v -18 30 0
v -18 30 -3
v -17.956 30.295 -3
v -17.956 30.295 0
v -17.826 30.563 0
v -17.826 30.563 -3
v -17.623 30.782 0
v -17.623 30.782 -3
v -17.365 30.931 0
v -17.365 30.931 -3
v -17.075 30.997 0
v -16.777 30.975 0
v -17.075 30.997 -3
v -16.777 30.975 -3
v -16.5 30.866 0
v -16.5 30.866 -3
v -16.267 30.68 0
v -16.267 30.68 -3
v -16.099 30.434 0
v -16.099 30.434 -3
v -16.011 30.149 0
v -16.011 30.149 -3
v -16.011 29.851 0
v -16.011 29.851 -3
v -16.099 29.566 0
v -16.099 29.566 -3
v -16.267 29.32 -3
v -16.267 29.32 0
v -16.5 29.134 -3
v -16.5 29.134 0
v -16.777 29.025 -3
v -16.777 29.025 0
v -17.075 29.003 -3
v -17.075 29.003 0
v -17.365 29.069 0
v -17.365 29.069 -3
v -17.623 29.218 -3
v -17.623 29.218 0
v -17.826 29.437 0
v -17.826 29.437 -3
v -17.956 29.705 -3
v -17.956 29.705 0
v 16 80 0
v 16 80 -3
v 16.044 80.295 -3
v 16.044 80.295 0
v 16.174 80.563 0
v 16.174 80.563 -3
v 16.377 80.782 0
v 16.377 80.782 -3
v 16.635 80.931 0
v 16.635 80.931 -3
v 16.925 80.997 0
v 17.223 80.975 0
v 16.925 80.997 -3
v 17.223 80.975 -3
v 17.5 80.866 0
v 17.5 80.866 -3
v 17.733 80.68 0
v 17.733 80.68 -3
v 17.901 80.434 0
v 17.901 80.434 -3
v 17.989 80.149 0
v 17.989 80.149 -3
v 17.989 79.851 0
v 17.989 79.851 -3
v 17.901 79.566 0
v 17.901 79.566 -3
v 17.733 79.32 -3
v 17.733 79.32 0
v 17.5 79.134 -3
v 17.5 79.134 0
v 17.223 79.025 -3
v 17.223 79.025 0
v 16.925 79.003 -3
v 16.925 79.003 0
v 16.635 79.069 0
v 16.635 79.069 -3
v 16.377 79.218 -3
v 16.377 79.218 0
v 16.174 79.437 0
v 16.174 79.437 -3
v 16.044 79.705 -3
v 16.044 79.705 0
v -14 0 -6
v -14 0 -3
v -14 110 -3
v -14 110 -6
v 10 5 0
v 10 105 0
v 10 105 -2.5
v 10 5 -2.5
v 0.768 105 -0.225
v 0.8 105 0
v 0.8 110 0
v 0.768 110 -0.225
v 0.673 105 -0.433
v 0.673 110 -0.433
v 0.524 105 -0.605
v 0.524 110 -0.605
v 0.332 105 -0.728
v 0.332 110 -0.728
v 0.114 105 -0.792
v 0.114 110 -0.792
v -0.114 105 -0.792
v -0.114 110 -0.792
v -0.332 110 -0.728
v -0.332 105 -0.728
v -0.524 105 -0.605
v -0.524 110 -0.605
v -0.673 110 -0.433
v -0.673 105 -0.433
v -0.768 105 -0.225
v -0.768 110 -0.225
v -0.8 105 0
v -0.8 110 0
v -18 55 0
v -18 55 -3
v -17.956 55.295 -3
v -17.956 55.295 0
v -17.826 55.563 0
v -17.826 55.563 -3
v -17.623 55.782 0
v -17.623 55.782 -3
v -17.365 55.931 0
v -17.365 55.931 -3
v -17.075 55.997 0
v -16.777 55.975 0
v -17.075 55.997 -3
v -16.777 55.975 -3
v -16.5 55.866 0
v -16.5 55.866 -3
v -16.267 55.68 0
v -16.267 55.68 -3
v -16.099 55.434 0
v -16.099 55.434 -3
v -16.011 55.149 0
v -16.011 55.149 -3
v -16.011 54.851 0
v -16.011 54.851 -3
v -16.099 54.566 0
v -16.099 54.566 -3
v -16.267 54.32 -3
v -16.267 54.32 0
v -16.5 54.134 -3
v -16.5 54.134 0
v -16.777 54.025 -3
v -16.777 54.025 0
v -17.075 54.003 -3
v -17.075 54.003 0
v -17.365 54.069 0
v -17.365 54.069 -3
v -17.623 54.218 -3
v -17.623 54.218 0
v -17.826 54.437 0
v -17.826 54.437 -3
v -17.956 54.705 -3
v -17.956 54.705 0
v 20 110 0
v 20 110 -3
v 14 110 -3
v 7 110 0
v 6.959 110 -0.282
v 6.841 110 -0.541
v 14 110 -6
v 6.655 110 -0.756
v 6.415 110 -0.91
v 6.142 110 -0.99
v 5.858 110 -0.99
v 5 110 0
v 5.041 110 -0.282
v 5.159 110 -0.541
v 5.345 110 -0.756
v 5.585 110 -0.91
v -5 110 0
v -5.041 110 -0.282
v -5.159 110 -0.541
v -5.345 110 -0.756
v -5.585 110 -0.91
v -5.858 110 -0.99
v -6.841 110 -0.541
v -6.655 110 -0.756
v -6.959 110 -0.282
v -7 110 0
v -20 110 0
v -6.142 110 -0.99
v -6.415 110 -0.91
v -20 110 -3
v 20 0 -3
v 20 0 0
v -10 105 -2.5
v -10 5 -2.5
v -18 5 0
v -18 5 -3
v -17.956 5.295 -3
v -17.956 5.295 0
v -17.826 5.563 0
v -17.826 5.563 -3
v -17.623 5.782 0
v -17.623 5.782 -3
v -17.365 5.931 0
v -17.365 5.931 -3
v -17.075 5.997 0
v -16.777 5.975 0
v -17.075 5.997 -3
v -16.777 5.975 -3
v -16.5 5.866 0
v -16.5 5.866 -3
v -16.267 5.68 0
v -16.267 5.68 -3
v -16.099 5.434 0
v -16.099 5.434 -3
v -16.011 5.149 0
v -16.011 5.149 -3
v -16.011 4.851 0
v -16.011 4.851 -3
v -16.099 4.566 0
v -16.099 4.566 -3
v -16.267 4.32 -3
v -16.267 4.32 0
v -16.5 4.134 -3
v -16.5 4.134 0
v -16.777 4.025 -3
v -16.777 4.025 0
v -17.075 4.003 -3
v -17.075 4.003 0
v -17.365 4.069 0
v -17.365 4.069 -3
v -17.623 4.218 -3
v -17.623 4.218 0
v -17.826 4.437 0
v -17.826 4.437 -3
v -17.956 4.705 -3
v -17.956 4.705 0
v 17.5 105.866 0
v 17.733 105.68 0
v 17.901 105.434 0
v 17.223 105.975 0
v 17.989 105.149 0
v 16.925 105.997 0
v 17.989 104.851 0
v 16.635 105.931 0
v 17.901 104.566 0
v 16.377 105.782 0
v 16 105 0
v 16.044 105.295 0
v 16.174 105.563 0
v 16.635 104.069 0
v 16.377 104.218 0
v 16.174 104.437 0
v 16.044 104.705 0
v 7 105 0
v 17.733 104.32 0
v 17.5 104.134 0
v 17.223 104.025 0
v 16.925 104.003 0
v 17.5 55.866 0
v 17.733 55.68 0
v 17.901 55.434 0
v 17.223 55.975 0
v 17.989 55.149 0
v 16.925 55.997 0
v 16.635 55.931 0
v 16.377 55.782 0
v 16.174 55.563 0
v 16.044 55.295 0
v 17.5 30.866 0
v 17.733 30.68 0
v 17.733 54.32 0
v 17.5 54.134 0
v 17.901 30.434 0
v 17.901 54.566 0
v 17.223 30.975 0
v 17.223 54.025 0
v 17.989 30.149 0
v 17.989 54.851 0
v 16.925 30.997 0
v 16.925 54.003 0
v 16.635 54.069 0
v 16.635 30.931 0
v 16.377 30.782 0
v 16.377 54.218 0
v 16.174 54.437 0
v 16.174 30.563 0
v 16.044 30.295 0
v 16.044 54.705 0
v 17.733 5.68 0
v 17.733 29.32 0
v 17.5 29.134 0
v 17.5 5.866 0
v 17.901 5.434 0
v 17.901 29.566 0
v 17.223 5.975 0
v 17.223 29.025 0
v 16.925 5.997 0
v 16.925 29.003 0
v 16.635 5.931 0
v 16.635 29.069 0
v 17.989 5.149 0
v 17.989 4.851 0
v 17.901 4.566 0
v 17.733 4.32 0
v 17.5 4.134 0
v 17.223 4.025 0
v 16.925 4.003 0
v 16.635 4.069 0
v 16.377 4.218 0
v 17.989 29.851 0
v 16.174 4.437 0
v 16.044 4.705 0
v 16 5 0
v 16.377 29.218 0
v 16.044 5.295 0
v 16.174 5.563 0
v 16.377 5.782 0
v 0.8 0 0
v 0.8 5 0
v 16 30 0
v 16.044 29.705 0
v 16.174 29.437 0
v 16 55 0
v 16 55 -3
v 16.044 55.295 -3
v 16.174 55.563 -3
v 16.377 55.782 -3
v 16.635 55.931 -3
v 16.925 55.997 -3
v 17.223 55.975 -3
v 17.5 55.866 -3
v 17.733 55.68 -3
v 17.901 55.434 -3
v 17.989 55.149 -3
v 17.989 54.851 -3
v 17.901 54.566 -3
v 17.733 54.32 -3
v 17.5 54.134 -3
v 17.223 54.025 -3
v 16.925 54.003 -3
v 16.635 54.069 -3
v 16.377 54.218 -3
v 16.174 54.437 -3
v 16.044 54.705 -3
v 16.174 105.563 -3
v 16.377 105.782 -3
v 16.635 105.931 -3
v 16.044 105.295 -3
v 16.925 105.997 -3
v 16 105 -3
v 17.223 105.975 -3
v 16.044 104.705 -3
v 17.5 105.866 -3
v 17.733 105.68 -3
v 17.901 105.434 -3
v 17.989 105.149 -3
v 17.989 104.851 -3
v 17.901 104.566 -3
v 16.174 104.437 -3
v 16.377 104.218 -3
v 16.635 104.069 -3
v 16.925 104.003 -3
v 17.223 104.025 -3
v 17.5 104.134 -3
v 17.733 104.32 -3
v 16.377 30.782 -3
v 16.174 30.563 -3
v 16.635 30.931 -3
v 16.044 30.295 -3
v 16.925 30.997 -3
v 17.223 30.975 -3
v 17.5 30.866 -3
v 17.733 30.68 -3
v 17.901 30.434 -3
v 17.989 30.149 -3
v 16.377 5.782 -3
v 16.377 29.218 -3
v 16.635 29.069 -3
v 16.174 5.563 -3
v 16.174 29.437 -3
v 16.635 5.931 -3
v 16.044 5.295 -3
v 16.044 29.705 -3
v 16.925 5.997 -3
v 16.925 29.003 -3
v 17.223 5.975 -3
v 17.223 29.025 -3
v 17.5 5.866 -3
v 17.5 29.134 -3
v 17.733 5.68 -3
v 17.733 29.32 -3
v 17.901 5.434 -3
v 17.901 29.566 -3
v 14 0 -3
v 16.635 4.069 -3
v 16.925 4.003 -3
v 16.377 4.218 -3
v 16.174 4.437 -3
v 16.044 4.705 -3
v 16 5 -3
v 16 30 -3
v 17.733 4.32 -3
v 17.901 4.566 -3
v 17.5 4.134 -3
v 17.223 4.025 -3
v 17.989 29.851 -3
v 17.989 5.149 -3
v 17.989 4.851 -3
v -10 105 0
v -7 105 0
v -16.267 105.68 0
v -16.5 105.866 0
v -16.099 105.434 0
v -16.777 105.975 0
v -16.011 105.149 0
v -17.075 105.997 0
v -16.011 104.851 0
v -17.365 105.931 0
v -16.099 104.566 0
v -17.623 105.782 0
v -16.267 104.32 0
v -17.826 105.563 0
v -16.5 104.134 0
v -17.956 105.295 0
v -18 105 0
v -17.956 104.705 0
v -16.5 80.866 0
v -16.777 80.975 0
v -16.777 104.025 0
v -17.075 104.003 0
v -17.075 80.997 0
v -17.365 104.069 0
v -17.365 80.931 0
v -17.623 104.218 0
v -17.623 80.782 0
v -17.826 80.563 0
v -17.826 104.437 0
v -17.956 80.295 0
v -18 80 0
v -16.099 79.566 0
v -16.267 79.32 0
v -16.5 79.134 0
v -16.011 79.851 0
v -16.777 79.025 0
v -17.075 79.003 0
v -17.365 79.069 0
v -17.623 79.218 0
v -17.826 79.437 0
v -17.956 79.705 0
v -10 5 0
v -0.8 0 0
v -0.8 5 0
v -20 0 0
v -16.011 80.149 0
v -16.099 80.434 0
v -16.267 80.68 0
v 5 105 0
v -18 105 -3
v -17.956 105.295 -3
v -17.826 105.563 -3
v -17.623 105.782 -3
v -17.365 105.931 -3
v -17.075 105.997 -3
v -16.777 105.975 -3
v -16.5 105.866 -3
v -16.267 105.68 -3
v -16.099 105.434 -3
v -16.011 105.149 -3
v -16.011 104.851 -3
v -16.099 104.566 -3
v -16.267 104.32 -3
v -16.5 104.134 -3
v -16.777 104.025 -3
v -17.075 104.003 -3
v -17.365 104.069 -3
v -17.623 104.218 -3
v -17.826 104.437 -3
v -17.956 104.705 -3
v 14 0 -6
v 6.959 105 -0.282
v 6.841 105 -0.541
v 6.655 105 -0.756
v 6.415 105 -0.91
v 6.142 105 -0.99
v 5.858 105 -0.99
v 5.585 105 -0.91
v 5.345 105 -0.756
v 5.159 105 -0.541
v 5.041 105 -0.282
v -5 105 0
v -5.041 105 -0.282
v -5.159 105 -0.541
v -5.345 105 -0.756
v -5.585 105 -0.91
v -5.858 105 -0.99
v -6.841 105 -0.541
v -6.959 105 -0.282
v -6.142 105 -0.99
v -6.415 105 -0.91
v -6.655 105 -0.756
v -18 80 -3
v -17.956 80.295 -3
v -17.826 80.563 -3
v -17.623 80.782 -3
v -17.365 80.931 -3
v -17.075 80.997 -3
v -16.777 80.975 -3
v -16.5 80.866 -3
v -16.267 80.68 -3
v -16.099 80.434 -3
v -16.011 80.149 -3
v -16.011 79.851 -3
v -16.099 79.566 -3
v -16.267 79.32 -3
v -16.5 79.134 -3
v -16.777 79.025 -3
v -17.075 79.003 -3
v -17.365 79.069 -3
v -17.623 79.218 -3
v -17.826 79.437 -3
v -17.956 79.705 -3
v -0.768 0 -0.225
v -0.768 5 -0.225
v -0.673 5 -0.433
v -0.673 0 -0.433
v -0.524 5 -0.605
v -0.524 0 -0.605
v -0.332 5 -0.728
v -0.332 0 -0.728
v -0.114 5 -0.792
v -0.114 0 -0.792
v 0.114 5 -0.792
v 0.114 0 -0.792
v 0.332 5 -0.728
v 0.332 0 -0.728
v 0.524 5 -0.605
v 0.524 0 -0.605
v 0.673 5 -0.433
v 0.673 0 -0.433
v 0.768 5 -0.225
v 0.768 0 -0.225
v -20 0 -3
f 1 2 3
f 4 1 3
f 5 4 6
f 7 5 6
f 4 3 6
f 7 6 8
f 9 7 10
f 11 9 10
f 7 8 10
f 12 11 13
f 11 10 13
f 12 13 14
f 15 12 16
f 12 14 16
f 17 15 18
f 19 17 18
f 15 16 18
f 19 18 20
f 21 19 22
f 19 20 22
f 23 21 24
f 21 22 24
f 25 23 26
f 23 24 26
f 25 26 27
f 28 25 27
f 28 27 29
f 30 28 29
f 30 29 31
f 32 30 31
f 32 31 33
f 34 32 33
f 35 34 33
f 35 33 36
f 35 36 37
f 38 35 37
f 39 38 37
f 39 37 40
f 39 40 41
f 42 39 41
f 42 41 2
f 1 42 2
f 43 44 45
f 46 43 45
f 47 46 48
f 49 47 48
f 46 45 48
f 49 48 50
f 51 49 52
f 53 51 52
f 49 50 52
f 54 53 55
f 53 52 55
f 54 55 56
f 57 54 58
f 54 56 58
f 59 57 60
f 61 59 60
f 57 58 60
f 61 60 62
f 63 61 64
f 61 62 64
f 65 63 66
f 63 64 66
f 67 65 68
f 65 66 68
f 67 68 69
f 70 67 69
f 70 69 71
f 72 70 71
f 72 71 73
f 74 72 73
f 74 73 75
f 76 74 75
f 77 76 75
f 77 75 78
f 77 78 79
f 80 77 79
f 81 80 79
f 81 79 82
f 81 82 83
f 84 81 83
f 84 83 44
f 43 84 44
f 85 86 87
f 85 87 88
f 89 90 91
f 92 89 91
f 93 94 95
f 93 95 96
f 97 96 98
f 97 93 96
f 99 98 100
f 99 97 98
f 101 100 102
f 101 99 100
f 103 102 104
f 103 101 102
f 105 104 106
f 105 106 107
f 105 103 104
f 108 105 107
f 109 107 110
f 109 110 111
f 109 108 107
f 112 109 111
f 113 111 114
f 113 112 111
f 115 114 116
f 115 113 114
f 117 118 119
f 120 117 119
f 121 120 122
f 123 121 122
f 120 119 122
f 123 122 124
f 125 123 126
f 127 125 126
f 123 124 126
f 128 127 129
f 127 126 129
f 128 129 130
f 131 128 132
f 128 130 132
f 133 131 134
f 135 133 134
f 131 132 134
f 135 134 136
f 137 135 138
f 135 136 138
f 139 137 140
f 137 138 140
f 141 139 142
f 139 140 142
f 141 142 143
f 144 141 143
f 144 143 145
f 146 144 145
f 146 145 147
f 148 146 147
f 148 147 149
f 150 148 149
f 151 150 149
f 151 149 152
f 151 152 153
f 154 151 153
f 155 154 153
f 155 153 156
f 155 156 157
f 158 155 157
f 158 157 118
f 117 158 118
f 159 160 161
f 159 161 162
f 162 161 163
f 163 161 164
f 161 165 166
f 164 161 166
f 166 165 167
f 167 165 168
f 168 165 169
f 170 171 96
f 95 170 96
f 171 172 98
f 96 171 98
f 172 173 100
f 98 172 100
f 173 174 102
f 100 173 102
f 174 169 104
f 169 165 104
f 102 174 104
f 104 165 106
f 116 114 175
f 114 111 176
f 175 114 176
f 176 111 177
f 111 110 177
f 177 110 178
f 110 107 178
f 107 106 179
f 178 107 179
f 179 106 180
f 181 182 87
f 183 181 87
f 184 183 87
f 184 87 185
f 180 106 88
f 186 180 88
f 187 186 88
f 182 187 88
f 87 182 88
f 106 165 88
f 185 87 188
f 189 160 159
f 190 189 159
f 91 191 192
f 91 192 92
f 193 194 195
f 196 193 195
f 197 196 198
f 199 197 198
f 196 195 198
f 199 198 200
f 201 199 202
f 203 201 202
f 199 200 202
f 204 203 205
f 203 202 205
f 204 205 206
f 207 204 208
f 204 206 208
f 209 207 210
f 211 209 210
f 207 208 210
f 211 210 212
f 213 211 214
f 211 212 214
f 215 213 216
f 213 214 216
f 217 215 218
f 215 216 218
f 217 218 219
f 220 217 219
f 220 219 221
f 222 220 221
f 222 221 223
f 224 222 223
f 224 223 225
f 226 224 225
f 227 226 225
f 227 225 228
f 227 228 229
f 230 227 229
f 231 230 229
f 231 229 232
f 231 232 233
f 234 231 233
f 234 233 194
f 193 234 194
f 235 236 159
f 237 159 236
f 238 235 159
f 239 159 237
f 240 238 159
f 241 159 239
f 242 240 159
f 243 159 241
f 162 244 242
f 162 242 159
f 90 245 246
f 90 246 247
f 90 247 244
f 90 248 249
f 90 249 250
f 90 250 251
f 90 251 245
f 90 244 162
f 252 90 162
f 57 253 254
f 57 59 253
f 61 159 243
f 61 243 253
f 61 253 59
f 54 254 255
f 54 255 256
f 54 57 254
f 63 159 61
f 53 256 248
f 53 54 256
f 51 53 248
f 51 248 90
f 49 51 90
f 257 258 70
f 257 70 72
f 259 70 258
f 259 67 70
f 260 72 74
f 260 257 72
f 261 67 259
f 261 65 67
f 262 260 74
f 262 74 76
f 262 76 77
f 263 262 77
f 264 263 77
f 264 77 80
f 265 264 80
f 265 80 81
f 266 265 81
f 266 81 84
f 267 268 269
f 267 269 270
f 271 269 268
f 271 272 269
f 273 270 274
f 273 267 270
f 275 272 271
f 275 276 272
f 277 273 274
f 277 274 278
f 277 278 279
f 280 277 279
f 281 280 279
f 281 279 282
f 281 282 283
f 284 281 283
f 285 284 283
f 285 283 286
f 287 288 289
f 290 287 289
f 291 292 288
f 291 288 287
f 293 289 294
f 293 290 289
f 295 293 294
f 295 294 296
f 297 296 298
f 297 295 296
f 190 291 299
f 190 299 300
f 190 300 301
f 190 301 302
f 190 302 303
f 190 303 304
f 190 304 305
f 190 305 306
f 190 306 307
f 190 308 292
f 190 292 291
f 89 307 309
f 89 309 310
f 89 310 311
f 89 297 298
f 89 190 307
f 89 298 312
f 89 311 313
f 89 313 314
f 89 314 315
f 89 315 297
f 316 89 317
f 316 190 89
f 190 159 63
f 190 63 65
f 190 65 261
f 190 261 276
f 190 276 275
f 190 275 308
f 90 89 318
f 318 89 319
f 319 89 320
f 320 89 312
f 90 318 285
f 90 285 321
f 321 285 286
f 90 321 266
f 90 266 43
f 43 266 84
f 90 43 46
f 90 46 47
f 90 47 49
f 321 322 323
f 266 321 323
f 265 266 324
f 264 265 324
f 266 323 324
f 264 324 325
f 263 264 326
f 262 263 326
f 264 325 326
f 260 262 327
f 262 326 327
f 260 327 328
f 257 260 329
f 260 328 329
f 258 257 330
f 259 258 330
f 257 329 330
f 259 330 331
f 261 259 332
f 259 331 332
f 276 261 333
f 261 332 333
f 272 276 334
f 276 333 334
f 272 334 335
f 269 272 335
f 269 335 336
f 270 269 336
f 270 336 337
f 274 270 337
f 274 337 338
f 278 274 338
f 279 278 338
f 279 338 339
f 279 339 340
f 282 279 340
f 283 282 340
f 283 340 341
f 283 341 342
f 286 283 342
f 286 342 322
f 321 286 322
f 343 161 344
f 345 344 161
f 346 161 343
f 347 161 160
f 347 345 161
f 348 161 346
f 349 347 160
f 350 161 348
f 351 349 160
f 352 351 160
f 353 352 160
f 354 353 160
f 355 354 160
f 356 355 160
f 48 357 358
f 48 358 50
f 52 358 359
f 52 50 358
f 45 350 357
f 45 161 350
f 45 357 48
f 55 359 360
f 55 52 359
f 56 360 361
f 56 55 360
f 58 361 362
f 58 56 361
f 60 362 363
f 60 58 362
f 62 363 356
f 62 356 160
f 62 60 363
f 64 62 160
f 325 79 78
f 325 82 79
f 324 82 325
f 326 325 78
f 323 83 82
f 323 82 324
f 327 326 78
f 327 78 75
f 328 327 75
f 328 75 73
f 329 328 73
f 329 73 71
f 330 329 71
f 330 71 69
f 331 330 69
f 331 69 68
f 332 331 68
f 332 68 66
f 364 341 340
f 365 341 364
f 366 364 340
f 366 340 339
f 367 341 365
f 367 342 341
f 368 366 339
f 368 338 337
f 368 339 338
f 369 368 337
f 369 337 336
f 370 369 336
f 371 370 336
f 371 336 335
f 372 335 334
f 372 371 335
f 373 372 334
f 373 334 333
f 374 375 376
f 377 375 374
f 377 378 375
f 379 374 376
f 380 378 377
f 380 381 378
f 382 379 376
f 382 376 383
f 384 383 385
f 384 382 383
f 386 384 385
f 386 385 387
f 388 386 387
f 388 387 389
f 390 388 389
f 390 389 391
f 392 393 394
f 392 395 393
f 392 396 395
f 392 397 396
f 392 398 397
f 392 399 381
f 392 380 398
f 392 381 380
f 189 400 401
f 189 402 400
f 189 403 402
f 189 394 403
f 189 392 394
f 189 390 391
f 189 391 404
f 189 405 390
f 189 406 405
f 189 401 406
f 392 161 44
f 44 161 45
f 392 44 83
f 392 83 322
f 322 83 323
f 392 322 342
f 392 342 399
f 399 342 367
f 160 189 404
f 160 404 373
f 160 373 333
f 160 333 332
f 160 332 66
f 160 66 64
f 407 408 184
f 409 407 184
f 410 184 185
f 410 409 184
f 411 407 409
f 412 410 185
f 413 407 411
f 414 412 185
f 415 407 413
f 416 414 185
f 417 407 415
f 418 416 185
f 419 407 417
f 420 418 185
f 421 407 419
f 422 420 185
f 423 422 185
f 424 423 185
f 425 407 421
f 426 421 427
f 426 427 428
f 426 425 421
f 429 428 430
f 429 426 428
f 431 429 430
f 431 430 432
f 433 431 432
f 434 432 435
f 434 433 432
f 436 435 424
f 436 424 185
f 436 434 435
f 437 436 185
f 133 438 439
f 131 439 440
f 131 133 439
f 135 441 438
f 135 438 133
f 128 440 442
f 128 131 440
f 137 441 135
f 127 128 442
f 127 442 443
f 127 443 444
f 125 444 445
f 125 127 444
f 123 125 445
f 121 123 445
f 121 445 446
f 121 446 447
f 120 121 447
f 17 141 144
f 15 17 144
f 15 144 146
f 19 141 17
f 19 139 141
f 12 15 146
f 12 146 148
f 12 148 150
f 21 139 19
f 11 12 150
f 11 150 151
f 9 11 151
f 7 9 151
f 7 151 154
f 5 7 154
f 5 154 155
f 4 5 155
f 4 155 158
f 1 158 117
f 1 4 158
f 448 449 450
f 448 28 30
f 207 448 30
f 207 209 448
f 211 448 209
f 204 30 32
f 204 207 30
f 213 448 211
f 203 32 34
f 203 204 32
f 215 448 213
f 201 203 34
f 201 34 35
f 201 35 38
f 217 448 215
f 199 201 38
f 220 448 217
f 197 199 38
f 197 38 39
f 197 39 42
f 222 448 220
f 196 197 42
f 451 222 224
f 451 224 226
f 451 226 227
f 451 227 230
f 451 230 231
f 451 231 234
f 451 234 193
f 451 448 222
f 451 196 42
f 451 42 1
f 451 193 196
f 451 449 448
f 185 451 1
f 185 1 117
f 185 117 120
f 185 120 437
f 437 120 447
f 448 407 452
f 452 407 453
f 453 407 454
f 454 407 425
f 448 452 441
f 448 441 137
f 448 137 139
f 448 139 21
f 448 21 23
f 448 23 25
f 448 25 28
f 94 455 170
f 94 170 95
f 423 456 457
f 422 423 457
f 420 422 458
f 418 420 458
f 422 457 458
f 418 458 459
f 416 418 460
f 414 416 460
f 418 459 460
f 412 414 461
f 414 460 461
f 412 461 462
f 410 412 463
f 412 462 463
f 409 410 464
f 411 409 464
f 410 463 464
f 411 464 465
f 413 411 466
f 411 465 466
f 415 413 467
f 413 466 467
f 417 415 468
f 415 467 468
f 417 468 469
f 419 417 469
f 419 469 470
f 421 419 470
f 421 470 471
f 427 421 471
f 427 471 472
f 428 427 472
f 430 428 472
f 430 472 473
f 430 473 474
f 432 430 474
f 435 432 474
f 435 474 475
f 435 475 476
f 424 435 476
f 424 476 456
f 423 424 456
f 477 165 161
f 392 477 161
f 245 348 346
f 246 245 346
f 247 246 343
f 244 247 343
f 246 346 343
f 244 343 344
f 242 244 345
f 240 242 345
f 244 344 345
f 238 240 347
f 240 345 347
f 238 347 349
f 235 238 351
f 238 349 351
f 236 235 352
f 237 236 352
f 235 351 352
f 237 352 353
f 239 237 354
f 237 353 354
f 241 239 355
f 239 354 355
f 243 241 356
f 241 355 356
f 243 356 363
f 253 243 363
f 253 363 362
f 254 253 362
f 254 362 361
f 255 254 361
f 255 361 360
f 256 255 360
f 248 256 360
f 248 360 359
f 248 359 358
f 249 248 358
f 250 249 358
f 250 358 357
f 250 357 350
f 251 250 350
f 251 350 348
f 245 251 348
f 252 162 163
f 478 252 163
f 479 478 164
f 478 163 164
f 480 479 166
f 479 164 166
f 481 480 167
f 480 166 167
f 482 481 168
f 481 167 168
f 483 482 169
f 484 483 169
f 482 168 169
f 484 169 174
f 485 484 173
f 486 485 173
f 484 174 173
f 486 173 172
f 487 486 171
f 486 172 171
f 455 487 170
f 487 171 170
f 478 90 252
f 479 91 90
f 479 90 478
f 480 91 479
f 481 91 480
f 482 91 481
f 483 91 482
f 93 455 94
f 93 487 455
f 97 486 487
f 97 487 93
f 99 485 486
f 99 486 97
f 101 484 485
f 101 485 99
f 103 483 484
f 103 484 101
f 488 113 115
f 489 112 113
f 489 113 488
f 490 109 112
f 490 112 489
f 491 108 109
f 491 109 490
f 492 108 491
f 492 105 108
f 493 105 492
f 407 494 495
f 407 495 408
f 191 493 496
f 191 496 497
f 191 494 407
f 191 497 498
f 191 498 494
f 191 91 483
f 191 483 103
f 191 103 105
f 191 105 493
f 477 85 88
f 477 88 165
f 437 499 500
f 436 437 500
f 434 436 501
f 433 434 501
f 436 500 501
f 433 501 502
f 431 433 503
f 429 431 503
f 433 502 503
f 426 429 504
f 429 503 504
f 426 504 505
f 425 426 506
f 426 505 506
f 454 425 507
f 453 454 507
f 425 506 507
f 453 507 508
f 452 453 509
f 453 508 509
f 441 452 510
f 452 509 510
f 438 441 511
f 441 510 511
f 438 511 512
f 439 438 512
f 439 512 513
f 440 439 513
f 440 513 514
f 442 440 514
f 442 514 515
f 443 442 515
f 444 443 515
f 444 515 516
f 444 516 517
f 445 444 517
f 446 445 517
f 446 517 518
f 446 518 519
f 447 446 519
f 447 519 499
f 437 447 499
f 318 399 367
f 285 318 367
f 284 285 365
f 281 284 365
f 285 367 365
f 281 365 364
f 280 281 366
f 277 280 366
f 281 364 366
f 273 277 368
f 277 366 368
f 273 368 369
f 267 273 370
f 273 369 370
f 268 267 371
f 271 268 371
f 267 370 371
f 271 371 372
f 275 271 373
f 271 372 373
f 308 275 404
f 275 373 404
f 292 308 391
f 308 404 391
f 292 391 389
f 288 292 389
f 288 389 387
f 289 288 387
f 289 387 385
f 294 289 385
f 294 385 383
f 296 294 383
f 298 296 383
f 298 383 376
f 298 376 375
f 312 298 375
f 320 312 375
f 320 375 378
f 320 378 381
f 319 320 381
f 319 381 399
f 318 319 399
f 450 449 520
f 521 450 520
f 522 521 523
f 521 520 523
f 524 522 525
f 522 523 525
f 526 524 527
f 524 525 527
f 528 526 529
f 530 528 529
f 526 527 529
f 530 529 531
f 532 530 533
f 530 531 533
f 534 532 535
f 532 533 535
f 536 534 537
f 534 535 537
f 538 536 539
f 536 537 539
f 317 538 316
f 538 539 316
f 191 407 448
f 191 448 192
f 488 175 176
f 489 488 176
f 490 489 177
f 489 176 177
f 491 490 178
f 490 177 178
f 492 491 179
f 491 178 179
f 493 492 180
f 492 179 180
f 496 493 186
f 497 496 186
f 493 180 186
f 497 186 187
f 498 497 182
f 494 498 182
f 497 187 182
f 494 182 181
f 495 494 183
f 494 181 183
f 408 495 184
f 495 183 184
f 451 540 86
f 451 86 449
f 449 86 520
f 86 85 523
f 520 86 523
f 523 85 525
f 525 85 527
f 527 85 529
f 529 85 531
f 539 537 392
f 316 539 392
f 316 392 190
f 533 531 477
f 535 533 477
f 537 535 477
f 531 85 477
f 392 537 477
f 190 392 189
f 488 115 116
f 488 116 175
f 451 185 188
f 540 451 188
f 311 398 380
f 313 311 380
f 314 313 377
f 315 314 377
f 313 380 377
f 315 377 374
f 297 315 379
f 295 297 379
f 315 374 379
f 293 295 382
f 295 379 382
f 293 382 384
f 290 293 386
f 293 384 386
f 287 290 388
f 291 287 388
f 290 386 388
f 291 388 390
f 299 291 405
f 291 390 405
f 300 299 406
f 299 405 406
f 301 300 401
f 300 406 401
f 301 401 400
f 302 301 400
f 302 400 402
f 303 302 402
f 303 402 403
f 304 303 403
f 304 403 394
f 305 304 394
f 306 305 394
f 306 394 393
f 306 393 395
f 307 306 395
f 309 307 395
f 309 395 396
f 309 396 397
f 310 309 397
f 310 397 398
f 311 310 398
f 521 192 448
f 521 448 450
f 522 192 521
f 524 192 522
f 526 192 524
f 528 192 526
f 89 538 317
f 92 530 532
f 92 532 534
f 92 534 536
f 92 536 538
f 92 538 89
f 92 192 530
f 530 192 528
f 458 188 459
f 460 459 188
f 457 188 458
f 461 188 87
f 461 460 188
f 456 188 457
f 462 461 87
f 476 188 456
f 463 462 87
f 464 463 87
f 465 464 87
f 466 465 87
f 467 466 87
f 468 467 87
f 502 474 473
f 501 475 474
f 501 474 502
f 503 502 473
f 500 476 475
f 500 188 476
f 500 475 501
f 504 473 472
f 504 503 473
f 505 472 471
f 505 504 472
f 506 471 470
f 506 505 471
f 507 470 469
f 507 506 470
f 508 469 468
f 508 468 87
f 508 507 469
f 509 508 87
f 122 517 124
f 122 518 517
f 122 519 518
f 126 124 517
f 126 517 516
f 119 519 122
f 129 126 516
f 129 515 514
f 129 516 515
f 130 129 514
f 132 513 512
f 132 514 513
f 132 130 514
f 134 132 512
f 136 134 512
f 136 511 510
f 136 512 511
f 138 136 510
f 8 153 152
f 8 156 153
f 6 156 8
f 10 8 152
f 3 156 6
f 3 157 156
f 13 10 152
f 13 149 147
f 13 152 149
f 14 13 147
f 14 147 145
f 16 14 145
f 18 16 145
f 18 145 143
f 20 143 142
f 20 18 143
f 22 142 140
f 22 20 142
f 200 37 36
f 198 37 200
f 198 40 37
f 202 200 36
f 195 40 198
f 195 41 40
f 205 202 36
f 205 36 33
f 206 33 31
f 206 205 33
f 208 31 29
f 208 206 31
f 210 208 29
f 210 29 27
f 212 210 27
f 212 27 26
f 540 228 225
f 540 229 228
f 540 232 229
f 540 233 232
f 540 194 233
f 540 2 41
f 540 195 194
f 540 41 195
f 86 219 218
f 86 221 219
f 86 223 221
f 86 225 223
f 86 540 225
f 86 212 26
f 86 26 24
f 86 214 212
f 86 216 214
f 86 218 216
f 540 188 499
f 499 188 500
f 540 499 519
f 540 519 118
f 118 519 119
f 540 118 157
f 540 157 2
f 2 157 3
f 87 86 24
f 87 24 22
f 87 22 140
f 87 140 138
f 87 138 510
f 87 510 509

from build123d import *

# Parameters (mm, degrees)
SKETCH1_W           = 28
SKETCH1_H           = 6
BOSS_EXTRUDE1_DEPTH = 105
SKETCH2_W           = 20
SKETCH2_H           = 5
CUT_EXTRUDE1_DEPTH  = 100
SKETCH3_W           = 6
SKETCH3_H           = 3
BOSS_EXTRUDE2_DEPTH = 105
SKETCH6_R           = 0.8
CUT_EXTRUDE4_DEPTH  = 10
BOSS_EXTRUDE3_DEPTH = 5
SKETCH7_R           = 1
CUT_EXTRUDE5_DEPTH  = 10
SKETCH9_R           = 1
CUT_EXTRUDE6_DEPTH  = 5


with BuildPart() as part:
    # Sketch1 → Boss-Extrude1 (new body)
    with BuildSketch(Plane(origin=(0, 0, 0), x_dir=(1, 0, 0), z_dir=(0, 1, 0))):
        with Locations((0, 3)):
            Rectangle(SKETCH1_W, SKETCH1_H)
    extrude(amount=BOSS_EXTRUDE1_DEPTH)

    # Sketch2 → Cut-Extrude1 (cut)
    with BuildSketch(Plane(origin=(0, 105, 0), x_dir=(1, 0, 0), z_dir=(0, 1, 0))):
        Rectangle(SKETCH2_W, SKETCH2_H)
    extrude(amount=-CUT_EXTRUDE1_DEPTH, mode=Mode.SUBTRACT)

    # Sketch3 → Boss-Extrude2 (add)
    with BuildSketch(Plane(origin=(0, 105, 0), x_dir=(1, 0, 0), z_dir=(0, 1, 0))):
        with Locations((17, 1.5)):
            Rectangle(SKETCH3_W, SKETCH3_H)
        with Locations((-17, 1.5)):
            Rectangle(SKETCH3_W, SKETCH3_H)
    extrude(amount=-BOSS_EXTRUDE2_DEPTH)

    # Sketch6 → Cut-Extrude4 (cut)
    with BuildSketch(Plane.XZ):
        Circle(SKETCH6_R)
    extrude(amount=-CUT_EXTRUDE4_DEPTH, mode=Mode.SUBTRACT)

    # Sketch8 → Boss-Extrude3 (add)
    with BuildSketch(Plane(origin=(0, 105, 0), x_dir=(1, 0, 0), z_dir=(0, 1, 0))):
        with BuildLine():
            Line((-0.8, 0), (-10, 0))
            Line((-10, 0), (-20, 0))
            Line((-20, 0), (-20, 3))
            Line((-20, 3), (-14, 3))
            Line((-14, 3), (-14, 6))
            Line((-14, 6), (14, 6))
            Line((14, 6), (14, 3))
            Line((14, 3), (20, 3))
            Line((20, 3), (20, 0))
            Line((20, 0), (10, 0))
            Line((10, 0), (0.8, 0))
            ThreePointArc((0.8, 0), (0, 0.8), (-0.8, 0))
        make_face()
    extrude(amount=BOSS_EXTRUDE3_DEPTH)

    # Sketch7 → Cut-Extrude5 (cut)
    with BuildSketch(Plane(origin=(0, 0, -3), x_dir=(-1, 0, 0), z_dir=(0, 0, -1))):
        with Locations((-17, 5)):
            Circle(SKETCH7_R)
        with Locations((-17, 30)):
            Circle(SKETCH7_R)
        with Locations((-17, 55)):
            Circle(SKETCH7_R)
        with Locations((-17, 80)):
            Circle(SKETCH7_R)
        with Locations((17, 80)):
            Circle(SKETCH7_R)
        with Locations((17, 55)):
            Circle(SKETCH7_R)
        with Locations((17, 30)):
            Circle(SKETCH7_R)
        with Locations((17, 5)):
            Circle(SKETCH7_R)
        with Locations((-17, 105)):
            Circle(SKETCH7_R)
        with Locations((17, 105)):
            Circle(SKETCH7_R)
    extrude(amount=-CUT_EXTRUDE5_DEPTH, mode=Mode.SUBTRACT)

    # Sketch9 → Cut-Extrude6 (cut)
    with BuildSketch(Plane(origin=(0, 110, 0), x_dir=(1, 0, 0), z_dir=(0, 1, 0))):
        with Locations((6, 0)):
            Circle(SKETCH9_R)
        with Locations((-6, 0)):
            Circle(SKETCH9_R)
    extrude(amount=-CUT_EXTRUDE6_DEPTH, mode=Mode.SUBTRACT)


solid = part.part
